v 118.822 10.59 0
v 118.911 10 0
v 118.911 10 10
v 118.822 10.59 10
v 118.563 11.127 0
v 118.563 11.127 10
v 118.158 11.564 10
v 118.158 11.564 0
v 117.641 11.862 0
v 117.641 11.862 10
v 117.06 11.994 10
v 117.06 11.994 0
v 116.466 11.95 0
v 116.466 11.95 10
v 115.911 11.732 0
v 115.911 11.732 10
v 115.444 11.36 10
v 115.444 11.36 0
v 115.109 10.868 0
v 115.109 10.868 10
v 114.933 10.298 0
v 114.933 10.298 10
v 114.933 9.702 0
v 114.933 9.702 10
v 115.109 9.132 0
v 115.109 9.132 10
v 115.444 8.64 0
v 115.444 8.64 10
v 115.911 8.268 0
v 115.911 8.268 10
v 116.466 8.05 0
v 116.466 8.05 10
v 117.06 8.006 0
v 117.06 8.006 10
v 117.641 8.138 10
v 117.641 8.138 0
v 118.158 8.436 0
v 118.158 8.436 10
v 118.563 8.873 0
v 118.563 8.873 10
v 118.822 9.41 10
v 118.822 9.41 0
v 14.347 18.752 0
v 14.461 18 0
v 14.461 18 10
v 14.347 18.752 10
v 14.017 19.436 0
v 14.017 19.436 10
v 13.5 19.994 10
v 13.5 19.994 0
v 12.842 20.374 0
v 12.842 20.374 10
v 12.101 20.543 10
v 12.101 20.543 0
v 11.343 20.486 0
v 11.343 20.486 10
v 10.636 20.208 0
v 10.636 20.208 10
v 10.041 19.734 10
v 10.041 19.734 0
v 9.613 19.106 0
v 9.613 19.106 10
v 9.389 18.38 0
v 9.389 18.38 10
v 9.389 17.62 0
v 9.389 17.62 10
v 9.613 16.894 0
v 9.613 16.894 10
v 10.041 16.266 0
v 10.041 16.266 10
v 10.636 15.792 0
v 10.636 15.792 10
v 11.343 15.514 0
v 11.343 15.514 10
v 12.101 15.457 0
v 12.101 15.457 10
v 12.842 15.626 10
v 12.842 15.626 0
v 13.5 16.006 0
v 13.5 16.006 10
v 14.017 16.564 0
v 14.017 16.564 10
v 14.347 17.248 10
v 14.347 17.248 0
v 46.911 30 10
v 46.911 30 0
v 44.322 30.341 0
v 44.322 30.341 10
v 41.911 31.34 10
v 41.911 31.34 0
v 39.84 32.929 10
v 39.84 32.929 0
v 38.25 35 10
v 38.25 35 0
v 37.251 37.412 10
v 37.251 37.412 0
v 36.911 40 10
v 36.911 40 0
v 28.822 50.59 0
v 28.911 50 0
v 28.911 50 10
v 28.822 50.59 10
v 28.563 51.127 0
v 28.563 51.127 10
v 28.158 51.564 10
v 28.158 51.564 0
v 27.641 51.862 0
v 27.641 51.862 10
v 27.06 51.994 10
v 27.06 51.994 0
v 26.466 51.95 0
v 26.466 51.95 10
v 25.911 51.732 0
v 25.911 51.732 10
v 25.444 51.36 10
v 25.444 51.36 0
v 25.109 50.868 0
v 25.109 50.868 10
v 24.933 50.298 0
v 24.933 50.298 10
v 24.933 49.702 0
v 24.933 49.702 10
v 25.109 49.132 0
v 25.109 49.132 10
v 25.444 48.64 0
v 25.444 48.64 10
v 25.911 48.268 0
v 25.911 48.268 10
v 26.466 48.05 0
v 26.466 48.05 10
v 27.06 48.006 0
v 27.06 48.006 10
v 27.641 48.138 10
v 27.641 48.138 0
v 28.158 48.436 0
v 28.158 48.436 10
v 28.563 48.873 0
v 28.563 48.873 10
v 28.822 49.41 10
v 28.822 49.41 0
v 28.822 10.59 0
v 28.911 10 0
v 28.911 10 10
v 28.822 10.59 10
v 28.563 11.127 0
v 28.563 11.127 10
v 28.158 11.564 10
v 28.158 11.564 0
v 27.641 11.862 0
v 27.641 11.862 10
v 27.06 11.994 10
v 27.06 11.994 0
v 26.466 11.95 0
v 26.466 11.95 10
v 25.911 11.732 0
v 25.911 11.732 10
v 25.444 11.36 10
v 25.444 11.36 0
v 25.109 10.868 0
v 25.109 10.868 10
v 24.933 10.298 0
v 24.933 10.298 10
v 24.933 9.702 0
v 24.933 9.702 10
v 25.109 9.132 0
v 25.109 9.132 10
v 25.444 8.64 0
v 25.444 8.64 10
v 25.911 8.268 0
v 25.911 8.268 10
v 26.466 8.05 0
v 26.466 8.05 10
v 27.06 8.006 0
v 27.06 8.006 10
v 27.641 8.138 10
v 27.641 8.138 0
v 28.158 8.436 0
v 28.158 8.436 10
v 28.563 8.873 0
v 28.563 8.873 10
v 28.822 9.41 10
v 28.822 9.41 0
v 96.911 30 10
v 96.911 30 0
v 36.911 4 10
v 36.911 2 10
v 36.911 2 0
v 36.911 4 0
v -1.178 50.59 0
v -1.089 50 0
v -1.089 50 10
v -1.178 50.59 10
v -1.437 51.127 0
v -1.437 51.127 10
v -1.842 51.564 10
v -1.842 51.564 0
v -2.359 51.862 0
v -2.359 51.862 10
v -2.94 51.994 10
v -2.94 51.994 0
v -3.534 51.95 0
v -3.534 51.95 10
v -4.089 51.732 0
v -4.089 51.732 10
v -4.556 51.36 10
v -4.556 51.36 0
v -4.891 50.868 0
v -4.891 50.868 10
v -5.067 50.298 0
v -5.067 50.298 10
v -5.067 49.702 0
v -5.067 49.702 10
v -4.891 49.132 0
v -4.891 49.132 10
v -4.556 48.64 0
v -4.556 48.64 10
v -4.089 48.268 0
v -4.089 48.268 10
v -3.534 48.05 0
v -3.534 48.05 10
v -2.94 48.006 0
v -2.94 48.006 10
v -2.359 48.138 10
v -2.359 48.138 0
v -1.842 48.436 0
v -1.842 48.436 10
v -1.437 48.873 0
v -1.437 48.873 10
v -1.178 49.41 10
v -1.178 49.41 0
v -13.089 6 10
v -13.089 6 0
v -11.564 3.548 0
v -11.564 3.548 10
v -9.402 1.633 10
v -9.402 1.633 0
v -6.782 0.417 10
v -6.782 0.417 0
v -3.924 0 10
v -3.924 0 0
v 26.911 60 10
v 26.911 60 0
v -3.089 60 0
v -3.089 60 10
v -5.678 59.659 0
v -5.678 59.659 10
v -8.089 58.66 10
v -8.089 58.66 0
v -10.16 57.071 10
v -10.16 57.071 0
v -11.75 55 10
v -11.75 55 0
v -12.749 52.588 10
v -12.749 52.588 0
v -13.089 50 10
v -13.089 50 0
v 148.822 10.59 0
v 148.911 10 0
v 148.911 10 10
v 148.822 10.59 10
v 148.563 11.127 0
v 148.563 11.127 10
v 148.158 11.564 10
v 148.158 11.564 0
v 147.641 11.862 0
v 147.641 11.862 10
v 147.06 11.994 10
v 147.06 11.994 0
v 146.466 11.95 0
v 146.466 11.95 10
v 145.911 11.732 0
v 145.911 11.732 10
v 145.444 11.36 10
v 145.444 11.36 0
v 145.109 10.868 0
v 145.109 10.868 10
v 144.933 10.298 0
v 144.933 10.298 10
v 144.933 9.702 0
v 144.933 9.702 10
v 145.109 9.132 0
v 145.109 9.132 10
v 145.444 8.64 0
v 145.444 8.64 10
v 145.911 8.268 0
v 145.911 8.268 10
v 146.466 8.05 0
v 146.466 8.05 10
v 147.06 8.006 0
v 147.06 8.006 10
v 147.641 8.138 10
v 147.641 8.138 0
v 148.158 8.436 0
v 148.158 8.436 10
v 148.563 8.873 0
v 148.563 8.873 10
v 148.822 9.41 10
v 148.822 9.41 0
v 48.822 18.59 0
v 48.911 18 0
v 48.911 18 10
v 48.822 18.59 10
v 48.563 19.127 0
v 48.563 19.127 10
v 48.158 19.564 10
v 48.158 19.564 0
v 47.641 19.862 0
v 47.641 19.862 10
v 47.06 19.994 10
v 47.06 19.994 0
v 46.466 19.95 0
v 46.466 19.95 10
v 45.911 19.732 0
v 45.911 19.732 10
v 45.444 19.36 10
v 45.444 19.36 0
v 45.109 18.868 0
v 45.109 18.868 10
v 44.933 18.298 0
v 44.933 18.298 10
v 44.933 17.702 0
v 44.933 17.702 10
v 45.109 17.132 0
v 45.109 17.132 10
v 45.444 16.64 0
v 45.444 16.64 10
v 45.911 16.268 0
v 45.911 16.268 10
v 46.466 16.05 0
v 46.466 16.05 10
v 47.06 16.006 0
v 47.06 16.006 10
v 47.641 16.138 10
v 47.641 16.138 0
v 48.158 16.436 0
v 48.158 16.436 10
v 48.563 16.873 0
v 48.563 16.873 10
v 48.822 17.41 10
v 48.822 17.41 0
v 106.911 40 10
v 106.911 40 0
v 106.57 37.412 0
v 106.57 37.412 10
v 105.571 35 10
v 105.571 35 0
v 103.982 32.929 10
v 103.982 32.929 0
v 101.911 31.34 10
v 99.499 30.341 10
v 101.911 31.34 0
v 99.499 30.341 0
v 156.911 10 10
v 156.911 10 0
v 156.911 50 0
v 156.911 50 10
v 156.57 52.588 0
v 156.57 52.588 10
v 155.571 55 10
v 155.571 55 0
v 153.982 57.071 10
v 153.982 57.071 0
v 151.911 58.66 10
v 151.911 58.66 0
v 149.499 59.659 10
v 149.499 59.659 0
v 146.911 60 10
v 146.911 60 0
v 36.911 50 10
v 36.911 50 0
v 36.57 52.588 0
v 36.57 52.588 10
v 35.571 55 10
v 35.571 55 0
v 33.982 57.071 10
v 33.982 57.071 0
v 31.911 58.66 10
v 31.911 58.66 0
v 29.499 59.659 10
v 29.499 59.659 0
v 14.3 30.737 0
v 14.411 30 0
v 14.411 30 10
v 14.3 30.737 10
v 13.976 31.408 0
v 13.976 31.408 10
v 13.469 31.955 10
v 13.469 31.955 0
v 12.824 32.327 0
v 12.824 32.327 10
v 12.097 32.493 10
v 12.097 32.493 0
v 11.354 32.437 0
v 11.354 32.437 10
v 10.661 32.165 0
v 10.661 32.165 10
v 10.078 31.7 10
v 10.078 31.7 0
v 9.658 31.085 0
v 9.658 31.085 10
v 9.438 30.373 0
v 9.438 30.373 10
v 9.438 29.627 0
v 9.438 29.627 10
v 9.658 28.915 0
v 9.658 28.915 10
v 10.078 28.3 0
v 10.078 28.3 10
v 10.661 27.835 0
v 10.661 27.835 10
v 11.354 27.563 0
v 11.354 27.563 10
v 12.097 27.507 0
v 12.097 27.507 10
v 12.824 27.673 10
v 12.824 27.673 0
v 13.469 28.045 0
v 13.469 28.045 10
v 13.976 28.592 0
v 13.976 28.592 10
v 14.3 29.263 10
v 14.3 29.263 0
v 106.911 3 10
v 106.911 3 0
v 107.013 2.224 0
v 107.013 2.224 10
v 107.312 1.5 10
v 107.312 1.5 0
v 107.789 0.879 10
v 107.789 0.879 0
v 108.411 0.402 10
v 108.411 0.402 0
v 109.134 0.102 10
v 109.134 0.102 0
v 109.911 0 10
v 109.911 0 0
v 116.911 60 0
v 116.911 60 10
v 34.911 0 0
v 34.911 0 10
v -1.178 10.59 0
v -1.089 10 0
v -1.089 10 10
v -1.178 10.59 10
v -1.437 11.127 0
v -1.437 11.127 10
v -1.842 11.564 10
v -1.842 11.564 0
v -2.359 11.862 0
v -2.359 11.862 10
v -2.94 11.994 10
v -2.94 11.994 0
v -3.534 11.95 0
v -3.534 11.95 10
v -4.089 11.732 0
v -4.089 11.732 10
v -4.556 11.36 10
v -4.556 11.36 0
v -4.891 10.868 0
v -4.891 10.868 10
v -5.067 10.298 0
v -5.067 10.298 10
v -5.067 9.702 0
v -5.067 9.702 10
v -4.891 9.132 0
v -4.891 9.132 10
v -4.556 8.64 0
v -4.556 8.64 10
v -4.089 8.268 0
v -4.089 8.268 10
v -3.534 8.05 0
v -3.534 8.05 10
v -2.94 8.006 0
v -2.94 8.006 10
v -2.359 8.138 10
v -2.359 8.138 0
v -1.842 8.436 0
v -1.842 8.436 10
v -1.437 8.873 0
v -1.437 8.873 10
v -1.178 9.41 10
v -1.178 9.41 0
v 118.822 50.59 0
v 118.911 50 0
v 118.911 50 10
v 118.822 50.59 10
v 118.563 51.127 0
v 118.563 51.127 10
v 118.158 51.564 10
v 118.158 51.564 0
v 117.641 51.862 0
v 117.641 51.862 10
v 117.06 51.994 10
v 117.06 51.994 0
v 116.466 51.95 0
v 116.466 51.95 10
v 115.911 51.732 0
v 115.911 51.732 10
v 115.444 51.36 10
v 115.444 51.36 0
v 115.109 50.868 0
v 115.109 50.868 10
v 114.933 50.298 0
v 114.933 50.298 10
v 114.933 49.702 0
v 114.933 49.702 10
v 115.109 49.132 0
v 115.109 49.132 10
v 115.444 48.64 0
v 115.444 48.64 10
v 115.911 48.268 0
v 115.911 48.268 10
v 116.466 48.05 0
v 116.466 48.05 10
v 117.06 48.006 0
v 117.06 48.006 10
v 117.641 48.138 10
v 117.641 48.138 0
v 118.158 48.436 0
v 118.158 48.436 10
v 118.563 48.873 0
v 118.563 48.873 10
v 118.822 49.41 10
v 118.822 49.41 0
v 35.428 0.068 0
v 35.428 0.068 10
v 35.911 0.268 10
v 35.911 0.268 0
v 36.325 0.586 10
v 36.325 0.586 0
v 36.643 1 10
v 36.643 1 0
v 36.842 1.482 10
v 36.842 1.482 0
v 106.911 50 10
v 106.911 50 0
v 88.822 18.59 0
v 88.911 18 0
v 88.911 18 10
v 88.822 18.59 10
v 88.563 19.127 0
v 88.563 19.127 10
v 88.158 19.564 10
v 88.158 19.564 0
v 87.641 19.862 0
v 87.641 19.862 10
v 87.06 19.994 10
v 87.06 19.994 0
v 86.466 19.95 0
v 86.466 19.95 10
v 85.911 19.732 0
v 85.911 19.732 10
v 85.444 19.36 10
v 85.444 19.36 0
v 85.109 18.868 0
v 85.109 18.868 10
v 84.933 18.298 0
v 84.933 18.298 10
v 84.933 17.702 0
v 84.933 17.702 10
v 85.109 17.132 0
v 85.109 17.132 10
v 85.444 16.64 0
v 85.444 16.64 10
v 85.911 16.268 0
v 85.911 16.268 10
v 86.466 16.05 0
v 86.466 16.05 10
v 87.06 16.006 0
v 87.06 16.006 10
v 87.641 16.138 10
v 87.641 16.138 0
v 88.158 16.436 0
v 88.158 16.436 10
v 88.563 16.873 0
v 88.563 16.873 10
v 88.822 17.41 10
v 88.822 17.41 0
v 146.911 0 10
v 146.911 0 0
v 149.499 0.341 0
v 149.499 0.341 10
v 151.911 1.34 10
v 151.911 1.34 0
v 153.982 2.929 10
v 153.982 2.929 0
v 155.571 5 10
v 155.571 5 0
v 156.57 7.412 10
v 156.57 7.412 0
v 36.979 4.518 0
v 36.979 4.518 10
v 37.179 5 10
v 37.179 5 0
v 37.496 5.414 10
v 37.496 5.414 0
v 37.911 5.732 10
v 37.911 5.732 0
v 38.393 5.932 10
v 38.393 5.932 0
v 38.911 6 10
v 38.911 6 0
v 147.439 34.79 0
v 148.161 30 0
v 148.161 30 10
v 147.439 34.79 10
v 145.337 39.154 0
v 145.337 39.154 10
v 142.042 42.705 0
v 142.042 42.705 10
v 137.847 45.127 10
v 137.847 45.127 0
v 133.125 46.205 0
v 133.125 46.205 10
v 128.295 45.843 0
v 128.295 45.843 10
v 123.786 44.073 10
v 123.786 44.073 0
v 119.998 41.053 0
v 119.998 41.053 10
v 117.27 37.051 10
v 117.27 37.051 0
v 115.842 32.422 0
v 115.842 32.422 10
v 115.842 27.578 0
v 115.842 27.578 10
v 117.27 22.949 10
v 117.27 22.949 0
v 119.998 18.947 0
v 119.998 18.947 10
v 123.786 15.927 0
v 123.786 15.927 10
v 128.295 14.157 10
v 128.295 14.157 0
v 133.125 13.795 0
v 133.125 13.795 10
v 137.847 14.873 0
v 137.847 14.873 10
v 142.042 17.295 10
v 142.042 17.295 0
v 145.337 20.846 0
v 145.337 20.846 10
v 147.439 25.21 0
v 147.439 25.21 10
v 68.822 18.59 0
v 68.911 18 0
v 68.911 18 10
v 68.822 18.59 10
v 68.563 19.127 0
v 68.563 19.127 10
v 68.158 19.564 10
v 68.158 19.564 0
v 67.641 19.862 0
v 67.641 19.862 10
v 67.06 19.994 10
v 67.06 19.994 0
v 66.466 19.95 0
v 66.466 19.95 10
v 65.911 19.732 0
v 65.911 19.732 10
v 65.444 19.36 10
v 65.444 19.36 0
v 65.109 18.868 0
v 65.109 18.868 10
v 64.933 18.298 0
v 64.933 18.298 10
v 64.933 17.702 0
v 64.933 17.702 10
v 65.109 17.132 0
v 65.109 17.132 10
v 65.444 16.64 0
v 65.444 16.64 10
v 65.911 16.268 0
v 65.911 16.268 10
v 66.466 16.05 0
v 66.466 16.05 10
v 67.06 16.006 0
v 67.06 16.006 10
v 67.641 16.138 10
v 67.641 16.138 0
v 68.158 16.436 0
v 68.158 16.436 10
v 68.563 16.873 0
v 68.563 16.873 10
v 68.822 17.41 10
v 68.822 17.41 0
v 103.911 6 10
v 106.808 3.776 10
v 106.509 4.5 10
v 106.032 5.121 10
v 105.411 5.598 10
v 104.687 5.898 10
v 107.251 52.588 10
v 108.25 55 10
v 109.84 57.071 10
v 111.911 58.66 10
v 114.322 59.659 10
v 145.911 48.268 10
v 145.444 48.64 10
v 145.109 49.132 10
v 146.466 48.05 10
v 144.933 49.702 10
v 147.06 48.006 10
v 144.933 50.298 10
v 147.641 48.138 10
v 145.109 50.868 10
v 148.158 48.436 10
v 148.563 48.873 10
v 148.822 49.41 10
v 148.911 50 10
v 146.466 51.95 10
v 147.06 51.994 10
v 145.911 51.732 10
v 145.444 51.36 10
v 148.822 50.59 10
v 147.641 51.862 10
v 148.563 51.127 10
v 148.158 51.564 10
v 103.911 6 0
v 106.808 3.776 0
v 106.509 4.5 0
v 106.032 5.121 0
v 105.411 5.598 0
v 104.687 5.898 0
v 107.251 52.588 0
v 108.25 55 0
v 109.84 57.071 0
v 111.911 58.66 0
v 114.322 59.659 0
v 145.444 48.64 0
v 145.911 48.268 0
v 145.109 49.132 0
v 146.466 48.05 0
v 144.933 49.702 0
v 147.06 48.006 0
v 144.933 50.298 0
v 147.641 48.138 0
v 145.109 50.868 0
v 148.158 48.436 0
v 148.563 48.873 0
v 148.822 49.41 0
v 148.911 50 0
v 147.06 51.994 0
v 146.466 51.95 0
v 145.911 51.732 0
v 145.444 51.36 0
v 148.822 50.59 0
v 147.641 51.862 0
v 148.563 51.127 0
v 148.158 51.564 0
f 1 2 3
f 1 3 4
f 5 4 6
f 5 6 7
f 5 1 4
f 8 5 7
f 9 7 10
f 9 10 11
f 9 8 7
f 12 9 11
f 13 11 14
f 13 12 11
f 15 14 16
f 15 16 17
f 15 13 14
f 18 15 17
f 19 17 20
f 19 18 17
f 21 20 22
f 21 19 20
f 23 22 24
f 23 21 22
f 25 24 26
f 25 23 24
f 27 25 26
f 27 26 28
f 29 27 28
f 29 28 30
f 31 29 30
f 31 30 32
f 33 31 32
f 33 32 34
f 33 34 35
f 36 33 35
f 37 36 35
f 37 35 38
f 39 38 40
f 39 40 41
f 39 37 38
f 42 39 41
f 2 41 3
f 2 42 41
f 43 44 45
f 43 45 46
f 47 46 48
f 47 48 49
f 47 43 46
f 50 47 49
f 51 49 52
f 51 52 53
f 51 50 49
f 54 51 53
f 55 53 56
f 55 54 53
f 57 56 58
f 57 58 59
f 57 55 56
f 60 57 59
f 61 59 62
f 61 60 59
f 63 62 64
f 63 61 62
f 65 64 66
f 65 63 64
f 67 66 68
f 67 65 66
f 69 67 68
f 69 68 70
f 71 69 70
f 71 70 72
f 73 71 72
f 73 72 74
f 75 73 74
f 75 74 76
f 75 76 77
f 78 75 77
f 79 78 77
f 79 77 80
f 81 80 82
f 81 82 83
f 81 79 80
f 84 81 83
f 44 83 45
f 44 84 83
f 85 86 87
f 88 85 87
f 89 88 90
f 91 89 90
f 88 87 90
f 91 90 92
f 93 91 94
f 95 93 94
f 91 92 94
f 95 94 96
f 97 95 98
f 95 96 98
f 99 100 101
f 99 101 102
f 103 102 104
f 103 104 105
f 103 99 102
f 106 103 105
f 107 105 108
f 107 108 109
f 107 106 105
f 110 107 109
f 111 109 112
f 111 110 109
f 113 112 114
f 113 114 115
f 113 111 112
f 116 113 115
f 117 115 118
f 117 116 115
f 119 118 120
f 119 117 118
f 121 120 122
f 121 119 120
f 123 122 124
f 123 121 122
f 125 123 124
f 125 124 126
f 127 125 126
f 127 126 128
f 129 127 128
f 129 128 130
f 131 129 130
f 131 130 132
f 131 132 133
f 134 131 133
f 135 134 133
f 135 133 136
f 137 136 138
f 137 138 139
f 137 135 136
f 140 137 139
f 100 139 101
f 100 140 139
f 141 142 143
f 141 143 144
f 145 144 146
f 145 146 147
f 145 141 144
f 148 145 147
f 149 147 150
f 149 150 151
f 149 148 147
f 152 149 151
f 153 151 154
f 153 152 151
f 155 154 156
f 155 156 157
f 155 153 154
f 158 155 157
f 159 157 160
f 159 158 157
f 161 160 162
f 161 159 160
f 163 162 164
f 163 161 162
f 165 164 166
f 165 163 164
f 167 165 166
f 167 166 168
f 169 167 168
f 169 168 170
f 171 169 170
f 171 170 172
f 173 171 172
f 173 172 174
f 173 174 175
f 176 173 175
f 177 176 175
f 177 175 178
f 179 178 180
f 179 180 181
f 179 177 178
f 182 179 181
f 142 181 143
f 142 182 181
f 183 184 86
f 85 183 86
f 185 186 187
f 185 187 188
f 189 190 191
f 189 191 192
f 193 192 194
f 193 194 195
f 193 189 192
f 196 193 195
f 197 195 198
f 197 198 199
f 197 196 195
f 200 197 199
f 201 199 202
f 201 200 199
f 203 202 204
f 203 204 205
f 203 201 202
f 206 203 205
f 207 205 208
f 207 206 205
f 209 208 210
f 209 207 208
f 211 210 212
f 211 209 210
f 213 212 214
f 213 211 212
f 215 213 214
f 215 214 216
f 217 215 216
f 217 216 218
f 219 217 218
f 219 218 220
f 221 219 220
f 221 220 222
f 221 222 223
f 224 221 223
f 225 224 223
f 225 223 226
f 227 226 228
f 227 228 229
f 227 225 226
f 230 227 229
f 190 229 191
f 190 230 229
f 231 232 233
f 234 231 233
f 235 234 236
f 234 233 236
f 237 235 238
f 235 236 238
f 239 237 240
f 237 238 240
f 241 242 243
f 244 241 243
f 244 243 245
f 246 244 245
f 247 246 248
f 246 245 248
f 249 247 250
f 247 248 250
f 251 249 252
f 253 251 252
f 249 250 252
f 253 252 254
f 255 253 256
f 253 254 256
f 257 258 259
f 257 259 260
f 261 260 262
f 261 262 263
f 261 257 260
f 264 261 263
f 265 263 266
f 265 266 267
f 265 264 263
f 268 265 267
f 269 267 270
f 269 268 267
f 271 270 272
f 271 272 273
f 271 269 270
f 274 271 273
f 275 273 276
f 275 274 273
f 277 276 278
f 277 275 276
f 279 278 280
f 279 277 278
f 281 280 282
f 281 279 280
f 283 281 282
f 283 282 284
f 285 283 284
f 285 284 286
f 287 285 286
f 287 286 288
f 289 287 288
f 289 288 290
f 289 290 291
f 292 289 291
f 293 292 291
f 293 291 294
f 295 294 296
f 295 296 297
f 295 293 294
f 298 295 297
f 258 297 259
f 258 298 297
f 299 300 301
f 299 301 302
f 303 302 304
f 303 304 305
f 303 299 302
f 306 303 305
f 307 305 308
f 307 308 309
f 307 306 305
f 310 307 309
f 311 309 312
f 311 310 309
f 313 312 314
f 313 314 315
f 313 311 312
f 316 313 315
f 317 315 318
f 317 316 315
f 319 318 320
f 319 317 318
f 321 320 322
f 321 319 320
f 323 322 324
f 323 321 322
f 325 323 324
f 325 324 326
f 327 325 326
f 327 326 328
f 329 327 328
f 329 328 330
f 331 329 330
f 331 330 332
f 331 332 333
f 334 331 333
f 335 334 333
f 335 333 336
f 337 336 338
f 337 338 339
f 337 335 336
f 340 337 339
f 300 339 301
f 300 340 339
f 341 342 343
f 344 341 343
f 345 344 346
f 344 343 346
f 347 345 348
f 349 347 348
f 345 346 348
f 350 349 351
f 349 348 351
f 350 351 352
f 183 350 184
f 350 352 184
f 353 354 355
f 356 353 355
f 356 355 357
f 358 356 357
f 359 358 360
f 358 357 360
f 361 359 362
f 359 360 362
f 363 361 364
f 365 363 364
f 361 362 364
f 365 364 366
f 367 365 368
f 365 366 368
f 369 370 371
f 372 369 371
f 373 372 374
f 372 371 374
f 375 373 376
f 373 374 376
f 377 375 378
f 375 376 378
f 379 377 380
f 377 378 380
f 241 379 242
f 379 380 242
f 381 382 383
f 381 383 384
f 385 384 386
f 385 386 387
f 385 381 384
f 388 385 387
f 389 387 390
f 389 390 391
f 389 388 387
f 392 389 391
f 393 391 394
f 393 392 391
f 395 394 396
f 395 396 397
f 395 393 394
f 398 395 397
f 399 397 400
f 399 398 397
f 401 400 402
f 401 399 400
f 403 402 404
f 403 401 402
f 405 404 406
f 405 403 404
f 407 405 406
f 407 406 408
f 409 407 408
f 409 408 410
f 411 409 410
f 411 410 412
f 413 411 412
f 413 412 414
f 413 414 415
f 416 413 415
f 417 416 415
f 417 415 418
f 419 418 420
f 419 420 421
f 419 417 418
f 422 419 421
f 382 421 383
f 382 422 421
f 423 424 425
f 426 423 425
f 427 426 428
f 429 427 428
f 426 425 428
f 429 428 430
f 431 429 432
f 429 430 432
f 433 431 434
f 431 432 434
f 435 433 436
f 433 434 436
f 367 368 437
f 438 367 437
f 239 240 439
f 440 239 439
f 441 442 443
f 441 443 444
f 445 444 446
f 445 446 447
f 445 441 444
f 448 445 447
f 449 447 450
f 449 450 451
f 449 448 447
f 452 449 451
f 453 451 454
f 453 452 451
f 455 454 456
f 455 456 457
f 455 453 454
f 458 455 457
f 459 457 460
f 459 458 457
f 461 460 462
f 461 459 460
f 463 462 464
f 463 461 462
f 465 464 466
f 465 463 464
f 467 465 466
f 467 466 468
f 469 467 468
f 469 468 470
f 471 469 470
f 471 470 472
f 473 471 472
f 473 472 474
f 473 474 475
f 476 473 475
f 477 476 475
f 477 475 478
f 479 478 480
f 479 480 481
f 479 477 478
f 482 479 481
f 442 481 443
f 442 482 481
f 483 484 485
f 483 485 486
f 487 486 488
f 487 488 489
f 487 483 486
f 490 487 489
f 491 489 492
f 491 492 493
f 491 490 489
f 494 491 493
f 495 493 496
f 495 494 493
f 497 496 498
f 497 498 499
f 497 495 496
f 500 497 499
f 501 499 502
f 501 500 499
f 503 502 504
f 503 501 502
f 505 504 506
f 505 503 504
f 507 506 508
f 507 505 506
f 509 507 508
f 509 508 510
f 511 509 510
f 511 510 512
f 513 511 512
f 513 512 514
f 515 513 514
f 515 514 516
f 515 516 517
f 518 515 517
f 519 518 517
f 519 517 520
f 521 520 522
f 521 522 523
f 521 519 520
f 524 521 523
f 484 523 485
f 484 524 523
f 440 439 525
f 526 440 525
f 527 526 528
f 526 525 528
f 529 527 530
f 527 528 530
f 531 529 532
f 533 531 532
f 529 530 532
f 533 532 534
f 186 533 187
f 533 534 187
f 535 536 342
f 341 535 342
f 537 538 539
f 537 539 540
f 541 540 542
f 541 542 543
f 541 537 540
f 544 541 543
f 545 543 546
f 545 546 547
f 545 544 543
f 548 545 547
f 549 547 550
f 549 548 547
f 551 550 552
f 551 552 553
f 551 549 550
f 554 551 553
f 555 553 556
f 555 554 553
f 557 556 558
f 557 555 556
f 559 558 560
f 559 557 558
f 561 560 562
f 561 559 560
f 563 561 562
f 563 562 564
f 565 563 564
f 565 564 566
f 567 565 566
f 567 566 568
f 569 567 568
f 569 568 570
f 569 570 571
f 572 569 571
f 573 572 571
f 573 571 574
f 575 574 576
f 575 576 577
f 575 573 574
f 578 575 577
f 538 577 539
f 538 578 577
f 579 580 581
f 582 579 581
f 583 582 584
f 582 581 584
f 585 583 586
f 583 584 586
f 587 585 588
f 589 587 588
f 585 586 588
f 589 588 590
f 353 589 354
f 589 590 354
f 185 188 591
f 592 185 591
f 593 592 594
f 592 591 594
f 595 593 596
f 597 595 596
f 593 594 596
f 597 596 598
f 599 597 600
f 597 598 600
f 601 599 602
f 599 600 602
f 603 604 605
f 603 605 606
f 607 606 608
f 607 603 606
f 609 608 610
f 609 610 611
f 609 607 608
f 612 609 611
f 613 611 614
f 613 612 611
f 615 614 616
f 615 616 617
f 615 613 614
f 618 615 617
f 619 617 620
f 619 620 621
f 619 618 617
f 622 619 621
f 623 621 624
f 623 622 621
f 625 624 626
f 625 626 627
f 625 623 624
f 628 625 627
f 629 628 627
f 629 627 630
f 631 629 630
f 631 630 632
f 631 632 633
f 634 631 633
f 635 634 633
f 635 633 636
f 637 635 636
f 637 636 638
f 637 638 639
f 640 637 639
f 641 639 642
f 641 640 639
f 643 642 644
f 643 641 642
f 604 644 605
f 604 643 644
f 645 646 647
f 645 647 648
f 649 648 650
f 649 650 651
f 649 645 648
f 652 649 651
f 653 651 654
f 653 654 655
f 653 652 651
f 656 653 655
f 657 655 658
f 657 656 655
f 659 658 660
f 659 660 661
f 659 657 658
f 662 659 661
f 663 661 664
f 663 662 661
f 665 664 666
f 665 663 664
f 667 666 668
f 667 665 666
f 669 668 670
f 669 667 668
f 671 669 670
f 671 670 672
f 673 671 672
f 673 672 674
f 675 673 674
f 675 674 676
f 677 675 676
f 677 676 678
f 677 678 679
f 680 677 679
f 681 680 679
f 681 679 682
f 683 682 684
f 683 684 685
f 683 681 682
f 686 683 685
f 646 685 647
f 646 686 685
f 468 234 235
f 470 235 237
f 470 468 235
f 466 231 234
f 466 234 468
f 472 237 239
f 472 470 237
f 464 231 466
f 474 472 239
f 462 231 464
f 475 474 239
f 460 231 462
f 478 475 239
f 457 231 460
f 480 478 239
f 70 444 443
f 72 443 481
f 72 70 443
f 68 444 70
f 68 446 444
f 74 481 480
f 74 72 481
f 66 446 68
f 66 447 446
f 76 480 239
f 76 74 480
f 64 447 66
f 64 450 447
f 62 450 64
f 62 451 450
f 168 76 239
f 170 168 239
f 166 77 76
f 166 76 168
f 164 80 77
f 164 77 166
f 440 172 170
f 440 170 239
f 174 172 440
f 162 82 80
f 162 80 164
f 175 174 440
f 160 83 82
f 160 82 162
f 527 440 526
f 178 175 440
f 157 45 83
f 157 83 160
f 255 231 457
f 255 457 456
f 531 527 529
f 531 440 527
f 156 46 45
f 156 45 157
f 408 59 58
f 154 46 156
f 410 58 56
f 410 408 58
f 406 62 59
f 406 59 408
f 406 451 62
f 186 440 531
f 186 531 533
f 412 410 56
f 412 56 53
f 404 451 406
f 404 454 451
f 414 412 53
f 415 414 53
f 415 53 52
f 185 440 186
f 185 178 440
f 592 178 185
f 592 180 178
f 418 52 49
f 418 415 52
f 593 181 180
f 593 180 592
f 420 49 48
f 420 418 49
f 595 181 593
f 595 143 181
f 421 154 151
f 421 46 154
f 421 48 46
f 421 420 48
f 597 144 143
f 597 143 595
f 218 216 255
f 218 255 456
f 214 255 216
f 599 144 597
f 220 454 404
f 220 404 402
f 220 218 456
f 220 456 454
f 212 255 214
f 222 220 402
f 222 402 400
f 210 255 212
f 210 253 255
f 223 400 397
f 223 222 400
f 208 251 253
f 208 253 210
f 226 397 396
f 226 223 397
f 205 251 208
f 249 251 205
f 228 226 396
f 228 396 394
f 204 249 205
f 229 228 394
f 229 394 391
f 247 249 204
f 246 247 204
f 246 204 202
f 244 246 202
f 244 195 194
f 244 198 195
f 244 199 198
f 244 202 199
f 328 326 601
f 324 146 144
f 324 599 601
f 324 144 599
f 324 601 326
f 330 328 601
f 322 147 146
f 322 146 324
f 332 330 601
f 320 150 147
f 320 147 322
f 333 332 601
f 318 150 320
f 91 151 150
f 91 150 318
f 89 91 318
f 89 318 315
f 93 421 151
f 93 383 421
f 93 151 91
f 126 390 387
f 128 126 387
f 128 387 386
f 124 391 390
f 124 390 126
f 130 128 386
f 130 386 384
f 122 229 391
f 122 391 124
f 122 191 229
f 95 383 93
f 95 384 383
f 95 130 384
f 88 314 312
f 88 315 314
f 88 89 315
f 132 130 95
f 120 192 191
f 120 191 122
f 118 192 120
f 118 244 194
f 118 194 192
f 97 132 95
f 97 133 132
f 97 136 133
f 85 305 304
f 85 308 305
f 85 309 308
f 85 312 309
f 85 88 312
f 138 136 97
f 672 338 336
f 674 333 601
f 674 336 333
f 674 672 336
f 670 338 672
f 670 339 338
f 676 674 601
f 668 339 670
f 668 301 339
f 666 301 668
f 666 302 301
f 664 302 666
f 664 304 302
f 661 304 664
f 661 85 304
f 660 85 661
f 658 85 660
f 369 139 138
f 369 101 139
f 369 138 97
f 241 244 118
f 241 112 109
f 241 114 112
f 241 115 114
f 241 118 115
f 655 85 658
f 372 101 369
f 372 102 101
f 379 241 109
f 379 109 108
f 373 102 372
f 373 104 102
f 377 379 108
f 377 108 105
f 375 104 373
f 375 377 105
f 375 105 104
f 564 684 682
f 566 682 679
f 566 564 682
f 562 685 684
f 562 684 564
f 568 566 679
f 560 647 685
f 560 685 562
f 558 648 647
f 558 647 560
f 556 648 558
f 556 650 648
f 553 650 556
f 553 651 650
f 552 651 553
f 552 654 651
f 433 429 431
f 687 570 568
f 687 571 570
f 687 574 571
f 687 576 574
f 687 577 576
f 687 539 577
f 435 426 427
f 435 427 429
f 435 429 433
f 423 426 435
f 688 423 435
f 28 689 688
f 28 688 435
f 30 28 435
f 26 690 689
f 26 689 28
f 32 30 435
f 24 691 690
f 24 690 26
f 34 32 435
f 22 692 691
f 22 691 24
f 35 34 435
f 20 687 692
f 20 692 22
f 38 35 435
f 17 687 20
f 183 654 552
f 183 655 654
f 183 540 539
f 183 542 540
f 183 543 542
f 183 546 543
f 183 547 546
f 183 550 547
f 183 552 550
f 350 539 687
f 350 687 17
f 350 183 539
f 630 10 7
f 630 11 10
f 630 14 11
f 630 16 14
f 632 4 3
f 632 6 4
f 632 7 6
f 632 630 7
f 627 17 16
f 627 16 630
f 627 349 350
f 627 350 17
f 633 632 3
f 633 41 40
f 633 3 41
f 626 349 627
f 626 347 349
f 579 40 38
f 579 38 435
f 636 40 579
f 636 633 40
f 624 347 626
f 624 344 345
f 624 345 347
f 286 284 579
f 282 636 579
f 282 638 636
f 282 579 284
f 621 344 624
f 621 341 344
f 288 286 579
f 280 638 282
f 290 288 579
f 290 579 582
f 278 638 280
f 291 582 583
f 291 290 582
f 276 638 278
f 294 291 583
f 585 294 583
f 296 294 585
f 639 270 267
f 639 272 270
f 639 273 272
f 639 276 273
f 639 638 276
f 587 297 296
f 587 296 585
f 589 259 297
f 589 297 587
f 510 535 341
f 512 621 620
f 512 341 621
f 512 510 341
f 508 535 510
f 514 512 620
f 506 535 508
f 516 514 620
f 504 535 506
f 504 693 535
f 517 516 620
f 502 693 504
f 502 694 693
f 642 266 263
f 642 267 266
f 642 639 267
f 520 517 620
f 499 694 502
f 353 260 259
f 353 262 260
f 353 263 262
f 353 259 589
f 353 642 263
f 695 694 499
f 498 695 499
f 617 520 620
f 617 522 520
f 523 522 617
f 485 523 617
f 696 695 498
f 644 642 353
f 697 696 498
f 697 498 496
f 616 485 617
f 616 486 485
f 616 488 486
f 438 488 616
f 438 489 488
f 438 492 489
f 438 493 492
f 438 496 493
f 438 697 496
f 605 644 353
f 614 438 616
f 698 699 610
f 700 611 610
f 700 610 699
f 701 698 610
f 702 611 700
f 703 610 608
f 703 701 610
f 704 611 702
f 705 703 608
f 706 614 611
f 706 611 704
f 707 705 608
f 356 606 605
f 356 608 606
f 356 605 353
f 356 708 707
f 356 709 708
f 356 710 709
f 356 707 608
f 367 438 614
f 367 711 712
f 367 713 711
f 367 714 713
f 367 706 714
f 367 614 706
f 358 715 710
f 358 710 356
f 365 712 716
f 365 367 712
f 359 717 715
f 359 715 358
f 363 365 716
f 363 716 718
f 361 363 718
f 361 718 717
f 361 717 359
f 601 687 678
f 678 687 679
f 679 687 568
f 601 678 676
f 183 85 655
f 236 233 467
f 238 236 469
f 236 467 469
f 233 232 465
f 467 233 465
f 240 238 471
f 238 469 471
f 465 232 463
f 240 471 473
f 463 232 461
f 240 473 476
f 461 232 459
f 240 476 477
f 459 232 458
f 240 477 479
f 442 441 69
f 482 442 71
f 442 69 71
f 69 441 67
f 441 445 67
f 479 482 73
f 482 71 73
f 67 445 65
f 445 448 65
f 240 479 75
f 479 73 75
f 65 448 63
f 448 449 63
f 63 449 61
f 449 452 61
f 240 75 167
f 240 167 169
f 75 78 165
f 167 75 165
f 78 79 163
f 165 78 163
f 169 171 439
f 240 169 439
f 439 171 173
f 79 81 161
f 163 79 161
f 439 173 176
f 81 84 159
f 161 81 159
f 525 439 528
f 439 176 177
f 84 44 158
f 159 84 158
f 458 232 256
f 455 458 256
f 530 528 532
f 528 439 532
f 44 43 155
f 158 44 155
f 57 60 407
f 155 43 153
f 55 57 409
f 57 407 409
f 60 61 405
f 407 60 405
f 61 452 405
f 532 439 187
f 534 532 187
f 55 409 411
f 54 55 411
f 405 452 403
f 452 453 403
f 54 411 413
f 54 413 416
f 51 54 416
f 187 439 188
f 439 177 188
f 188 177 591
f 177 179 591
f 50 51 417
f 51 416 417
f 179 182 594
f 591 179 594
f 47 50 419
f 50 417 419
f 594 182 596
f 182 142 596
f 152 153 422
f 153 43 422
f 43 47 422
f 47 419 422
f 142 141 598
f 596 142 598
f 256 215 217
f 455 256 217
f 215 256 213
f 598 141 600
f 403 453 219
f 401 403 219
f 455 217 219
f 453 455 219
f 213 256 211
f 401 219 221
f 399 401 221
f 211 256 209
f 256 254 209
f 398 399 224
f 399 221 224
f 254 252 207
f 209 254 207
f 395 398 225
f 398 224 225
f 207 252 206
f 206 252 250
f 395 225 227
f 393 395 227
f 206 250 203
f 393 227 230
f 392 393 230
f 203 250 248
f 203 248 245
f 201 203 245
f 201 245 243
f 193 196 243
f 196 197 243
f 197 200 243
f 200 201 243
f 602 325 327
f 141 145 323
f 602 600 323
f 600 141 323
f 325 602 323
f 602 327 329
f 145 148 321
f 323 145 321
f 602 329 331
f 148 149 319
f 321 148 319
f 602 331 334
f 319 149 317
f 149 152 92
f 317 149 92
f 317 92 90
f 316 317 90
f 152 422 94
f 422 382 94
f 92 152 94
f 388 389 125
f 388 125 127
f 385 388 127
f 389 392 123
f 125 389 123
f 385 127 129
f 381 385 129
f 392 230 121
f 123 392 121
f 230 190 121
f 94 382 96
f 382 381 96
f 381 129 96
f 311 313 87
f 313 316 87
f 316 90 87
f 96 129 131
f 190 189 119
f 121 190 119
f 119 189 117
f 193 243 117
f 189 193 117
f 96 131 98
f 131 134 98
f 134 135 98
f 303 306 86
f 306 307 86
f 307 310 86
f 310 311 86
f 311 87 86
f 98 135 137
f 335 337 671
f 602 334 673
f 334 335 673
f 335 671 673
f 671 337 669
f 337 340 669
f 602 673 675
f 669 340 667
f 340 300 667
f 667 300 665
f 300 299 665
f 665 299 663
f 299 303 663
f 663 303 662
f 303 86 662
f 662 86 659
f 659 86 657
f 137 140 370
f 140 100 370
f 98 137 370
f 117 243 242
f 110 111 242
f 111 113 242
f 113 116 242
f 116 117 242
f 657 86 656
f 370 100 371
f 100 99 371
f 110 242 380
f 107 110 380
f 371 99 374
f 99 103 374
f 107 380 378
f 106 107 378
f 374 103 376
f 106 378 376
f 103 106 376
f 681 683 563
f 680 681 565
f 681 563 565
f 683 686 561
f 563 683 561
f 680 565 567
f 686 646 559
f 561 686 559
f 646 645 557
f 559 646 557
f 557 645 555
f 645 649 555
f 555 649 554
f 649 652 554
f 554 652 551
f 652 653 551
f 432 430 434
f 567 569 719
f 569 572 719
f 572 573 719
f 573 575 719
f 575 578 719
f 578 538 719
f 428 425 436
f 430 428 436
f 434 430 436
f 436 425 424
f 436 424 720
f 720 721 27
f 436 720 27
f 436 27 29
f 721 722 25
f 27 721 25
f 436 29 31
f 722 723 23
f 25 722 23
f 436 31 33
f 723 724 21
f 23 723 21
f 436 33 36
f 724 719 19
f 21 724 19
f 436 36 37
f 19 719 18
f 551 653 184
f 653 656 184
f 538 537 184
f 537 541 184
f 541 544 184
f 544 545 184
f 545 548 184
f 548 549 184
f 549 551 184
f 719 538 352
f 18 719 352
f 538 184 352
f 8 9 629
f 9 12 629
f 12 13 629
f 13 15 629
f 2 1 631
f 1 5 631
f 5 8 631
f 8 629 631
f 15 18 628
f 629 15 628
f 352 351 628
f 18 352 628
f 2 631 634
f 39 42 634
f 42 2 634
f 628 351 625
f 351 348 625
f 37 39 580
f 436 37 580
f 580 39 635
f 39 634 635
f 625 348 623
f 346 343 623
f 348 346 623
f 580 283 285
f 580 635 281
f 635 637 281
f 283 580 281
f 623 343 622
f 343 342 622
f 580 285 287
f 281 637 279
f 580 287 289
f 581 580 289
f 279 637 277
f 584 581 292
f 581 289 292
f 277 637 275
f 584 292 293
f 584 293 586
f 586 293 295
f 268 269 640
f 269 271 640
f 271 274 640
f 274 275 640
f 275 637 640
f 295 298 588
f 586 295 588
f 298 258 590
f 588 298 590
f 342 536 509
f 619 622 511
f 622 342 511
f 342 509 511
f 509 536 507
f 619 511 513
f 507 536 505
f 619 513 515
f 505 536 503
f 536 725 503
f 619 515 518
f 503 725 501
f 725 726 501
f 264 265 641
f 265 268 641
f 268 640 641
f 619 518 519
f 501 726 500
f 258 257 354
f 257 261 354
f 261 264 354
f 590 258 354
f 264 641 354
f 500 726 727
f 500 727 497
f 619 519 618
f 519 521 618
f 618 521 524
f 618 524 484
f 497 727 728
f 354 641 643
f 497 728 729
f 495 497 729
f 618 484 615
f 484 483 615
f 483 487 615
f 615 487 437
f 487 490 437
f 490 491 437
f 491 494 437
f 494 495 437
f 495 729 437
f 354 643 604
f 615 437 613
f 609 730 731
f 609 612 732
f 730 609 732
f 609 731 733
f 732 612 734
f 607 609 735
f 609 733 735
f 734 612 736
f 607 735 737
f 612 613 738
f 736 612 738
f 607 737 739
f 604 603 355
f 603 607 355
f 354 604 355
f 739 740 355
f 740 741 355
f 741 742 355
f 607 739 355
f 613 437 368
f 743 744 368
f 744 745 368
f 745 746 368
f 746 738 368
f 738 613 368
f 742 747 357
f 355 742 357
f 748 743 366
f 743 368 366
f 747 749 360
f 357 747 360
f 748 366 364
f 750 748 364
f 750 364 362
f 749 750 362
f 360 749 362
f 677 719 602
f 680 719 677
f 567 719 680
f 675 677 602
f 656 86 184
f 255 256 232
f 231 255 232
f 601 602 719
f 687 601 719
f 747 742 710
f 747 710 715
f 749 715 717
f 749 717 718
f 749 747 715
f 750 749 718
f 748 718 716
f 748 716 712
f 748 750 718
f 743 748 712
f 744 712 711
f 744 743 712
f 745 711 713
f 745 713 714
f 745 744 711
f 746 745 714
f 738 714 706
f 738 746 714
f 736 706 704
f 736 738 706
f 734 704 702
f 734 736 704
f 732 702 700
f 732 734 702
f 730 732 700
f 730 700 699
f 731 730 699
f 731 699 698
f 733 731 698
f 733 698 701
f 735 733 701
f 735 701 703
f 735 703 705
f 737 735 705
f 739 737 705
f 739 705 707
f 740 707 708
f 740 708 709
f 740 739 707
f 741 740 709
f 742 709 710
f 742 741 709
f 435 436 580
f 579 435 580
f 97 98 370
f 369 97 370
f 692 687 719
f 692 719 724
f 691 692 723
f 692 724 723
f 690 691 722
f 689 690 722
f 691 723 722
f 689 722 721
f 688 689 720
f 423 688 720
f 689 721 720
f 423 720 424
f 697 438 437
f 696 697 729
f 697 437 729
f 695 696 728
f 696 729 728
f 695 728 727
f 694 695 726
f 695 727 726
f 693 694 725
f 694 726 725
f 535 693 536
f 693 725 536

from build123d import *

# Parameters (mm, degrees)
MODEL_R             = 2
MODEL_R_2           = 2.5
MODEL_R_3           = 2.55
MODEL_R_4           = 16.25
BOSS_EXTRUDE1_DEPTH = 10


with BuildPart() as part:
    # Model → Boss-Extrude1 (new body)
    with BuildSketch(Plane.XY):
        with BuildLine():
            Line((-13.089430894, 50), (-13.089430894, 6))
            ThreePointArc((-13.089430894, 6), (-9.401505079, 1.633399735), (-3.924279504, 0))
            Line((-3.924279504, 0), (34.910569106, 0))
            ThreePointArc((34.910569106, 0), (36.324782668, 0.585786438), (36.910569106, 2))
            Line((36.910569106, 2), (36.910569106, 4))
            ThreePointArc((36.910569106, 4), (37.496355543, 5.414213562), (38.910569106, 6))
            Line((38.910569106, 6), (103.910569106, 6))
            ThreePointArc((103.910569106, 6), (106.031889449, 5.121320344), (106.910569106, 3))
            ThreePointArc((106.910569106, 3), (107.789248762, 0.878679656), (109.910569106, 0))
            Line((109.910569106, 0), (146.910569106, 0))
            ThreePointArc((146.910569106, 0), (153.981636918, 2.928932188), (156.910569106, 10))
            Line((156.910569106, 10), (156.910569106, 50))
            ThreePointArc((156.910569106, 50), (153.981636918, 57.071067812), (146.910569106, 60))
            Line((146.910569106, 60), (116.910569106, 60))
            ThreePointArc((116.910569106, 60), (109.839501294, 57.071067812), (106.910569106, 50))
            Line((106.910569106, 50), (106.910569106, 40))
            ThreePointArc((106.910569106, 40), (103.981636918, 32.928932188), (96.910569106, 30))
            Line((96.910569106, 30), (46.910569106, 30))
            ThreePointArc((46.910569106, 30), (39.839501294, 32.928932188), (36.910569106, 40))
            Line((36.910569106, 40), (36.910569106, 50))
            ThreePointArc((36.910569106, 50), (33.981636918, 57.071067812), (26.910569106, 60))
            Line((26.910569106, 60), (-3.089430894, 60))
            ThreePointArc((-3.089430894, 60), (-10.160498706, 57.071067812), (-13.089430894, 50))
        make_face()
        with Locations((26.910569106, 50)):
            Circle(MODEL_R, mode=Mode.SUBTRACT)
        with Locations((26.910569106, 10)):
            Circle(MODEL_R, mode=Mode.SUBTRACT)
        with Locations((11.910569106, 30)):
            Circle(MODEL_R_2, mode=Mode.SUBTRACT)
        with Locations((146.910569106, 50)):
            Circle(MODEL_R, mode=Mode.SUBTRACT)
        with Locations((86.910569106, 18)):
            Circle(MODEL_R, mode=Mode.SUBTRACT)
        with Locations((146.910569106, 10)):
            Circle(MODEL_R, mode=Mode.SUBTRACT)
        with Locations((116.910569106, 10)):
            Circle(MODEL_R, mode=Mode.SUBTRACT)
        with Locations((46.910569106, 18)):
            Circle(MODEL_R, mode=Mode.SUBTRACT)
        with Locations((66.910569106, 18)):
            Circle(MODEL_R, mode=Mode.SUBTRACT)
        with Locations((116.910569106, 50)):
            Circle(MODEL_R, mode=Mode.SUBTRACT)
        with Locations((11.910569106, 18)):
            Circle(MODEL_R_3, mode=Mode.SUBTRACT)
        with Locations((-3.089430894, 10)):
            Circle(MODEL_R, mode=Mode.SUBTRACT)
        with Locations((-3.089430894, 50)):
            Circle(MODEL_R, mode=Mode.SUBTRACT)
        with Locations((131.910569106, 30)):
            Circle(MODEL_R_4, mode=Mode.SUBTRACT)
    extrude(amount=BOSS_EXTRUDE1_DEPTH)


solid = part.part
